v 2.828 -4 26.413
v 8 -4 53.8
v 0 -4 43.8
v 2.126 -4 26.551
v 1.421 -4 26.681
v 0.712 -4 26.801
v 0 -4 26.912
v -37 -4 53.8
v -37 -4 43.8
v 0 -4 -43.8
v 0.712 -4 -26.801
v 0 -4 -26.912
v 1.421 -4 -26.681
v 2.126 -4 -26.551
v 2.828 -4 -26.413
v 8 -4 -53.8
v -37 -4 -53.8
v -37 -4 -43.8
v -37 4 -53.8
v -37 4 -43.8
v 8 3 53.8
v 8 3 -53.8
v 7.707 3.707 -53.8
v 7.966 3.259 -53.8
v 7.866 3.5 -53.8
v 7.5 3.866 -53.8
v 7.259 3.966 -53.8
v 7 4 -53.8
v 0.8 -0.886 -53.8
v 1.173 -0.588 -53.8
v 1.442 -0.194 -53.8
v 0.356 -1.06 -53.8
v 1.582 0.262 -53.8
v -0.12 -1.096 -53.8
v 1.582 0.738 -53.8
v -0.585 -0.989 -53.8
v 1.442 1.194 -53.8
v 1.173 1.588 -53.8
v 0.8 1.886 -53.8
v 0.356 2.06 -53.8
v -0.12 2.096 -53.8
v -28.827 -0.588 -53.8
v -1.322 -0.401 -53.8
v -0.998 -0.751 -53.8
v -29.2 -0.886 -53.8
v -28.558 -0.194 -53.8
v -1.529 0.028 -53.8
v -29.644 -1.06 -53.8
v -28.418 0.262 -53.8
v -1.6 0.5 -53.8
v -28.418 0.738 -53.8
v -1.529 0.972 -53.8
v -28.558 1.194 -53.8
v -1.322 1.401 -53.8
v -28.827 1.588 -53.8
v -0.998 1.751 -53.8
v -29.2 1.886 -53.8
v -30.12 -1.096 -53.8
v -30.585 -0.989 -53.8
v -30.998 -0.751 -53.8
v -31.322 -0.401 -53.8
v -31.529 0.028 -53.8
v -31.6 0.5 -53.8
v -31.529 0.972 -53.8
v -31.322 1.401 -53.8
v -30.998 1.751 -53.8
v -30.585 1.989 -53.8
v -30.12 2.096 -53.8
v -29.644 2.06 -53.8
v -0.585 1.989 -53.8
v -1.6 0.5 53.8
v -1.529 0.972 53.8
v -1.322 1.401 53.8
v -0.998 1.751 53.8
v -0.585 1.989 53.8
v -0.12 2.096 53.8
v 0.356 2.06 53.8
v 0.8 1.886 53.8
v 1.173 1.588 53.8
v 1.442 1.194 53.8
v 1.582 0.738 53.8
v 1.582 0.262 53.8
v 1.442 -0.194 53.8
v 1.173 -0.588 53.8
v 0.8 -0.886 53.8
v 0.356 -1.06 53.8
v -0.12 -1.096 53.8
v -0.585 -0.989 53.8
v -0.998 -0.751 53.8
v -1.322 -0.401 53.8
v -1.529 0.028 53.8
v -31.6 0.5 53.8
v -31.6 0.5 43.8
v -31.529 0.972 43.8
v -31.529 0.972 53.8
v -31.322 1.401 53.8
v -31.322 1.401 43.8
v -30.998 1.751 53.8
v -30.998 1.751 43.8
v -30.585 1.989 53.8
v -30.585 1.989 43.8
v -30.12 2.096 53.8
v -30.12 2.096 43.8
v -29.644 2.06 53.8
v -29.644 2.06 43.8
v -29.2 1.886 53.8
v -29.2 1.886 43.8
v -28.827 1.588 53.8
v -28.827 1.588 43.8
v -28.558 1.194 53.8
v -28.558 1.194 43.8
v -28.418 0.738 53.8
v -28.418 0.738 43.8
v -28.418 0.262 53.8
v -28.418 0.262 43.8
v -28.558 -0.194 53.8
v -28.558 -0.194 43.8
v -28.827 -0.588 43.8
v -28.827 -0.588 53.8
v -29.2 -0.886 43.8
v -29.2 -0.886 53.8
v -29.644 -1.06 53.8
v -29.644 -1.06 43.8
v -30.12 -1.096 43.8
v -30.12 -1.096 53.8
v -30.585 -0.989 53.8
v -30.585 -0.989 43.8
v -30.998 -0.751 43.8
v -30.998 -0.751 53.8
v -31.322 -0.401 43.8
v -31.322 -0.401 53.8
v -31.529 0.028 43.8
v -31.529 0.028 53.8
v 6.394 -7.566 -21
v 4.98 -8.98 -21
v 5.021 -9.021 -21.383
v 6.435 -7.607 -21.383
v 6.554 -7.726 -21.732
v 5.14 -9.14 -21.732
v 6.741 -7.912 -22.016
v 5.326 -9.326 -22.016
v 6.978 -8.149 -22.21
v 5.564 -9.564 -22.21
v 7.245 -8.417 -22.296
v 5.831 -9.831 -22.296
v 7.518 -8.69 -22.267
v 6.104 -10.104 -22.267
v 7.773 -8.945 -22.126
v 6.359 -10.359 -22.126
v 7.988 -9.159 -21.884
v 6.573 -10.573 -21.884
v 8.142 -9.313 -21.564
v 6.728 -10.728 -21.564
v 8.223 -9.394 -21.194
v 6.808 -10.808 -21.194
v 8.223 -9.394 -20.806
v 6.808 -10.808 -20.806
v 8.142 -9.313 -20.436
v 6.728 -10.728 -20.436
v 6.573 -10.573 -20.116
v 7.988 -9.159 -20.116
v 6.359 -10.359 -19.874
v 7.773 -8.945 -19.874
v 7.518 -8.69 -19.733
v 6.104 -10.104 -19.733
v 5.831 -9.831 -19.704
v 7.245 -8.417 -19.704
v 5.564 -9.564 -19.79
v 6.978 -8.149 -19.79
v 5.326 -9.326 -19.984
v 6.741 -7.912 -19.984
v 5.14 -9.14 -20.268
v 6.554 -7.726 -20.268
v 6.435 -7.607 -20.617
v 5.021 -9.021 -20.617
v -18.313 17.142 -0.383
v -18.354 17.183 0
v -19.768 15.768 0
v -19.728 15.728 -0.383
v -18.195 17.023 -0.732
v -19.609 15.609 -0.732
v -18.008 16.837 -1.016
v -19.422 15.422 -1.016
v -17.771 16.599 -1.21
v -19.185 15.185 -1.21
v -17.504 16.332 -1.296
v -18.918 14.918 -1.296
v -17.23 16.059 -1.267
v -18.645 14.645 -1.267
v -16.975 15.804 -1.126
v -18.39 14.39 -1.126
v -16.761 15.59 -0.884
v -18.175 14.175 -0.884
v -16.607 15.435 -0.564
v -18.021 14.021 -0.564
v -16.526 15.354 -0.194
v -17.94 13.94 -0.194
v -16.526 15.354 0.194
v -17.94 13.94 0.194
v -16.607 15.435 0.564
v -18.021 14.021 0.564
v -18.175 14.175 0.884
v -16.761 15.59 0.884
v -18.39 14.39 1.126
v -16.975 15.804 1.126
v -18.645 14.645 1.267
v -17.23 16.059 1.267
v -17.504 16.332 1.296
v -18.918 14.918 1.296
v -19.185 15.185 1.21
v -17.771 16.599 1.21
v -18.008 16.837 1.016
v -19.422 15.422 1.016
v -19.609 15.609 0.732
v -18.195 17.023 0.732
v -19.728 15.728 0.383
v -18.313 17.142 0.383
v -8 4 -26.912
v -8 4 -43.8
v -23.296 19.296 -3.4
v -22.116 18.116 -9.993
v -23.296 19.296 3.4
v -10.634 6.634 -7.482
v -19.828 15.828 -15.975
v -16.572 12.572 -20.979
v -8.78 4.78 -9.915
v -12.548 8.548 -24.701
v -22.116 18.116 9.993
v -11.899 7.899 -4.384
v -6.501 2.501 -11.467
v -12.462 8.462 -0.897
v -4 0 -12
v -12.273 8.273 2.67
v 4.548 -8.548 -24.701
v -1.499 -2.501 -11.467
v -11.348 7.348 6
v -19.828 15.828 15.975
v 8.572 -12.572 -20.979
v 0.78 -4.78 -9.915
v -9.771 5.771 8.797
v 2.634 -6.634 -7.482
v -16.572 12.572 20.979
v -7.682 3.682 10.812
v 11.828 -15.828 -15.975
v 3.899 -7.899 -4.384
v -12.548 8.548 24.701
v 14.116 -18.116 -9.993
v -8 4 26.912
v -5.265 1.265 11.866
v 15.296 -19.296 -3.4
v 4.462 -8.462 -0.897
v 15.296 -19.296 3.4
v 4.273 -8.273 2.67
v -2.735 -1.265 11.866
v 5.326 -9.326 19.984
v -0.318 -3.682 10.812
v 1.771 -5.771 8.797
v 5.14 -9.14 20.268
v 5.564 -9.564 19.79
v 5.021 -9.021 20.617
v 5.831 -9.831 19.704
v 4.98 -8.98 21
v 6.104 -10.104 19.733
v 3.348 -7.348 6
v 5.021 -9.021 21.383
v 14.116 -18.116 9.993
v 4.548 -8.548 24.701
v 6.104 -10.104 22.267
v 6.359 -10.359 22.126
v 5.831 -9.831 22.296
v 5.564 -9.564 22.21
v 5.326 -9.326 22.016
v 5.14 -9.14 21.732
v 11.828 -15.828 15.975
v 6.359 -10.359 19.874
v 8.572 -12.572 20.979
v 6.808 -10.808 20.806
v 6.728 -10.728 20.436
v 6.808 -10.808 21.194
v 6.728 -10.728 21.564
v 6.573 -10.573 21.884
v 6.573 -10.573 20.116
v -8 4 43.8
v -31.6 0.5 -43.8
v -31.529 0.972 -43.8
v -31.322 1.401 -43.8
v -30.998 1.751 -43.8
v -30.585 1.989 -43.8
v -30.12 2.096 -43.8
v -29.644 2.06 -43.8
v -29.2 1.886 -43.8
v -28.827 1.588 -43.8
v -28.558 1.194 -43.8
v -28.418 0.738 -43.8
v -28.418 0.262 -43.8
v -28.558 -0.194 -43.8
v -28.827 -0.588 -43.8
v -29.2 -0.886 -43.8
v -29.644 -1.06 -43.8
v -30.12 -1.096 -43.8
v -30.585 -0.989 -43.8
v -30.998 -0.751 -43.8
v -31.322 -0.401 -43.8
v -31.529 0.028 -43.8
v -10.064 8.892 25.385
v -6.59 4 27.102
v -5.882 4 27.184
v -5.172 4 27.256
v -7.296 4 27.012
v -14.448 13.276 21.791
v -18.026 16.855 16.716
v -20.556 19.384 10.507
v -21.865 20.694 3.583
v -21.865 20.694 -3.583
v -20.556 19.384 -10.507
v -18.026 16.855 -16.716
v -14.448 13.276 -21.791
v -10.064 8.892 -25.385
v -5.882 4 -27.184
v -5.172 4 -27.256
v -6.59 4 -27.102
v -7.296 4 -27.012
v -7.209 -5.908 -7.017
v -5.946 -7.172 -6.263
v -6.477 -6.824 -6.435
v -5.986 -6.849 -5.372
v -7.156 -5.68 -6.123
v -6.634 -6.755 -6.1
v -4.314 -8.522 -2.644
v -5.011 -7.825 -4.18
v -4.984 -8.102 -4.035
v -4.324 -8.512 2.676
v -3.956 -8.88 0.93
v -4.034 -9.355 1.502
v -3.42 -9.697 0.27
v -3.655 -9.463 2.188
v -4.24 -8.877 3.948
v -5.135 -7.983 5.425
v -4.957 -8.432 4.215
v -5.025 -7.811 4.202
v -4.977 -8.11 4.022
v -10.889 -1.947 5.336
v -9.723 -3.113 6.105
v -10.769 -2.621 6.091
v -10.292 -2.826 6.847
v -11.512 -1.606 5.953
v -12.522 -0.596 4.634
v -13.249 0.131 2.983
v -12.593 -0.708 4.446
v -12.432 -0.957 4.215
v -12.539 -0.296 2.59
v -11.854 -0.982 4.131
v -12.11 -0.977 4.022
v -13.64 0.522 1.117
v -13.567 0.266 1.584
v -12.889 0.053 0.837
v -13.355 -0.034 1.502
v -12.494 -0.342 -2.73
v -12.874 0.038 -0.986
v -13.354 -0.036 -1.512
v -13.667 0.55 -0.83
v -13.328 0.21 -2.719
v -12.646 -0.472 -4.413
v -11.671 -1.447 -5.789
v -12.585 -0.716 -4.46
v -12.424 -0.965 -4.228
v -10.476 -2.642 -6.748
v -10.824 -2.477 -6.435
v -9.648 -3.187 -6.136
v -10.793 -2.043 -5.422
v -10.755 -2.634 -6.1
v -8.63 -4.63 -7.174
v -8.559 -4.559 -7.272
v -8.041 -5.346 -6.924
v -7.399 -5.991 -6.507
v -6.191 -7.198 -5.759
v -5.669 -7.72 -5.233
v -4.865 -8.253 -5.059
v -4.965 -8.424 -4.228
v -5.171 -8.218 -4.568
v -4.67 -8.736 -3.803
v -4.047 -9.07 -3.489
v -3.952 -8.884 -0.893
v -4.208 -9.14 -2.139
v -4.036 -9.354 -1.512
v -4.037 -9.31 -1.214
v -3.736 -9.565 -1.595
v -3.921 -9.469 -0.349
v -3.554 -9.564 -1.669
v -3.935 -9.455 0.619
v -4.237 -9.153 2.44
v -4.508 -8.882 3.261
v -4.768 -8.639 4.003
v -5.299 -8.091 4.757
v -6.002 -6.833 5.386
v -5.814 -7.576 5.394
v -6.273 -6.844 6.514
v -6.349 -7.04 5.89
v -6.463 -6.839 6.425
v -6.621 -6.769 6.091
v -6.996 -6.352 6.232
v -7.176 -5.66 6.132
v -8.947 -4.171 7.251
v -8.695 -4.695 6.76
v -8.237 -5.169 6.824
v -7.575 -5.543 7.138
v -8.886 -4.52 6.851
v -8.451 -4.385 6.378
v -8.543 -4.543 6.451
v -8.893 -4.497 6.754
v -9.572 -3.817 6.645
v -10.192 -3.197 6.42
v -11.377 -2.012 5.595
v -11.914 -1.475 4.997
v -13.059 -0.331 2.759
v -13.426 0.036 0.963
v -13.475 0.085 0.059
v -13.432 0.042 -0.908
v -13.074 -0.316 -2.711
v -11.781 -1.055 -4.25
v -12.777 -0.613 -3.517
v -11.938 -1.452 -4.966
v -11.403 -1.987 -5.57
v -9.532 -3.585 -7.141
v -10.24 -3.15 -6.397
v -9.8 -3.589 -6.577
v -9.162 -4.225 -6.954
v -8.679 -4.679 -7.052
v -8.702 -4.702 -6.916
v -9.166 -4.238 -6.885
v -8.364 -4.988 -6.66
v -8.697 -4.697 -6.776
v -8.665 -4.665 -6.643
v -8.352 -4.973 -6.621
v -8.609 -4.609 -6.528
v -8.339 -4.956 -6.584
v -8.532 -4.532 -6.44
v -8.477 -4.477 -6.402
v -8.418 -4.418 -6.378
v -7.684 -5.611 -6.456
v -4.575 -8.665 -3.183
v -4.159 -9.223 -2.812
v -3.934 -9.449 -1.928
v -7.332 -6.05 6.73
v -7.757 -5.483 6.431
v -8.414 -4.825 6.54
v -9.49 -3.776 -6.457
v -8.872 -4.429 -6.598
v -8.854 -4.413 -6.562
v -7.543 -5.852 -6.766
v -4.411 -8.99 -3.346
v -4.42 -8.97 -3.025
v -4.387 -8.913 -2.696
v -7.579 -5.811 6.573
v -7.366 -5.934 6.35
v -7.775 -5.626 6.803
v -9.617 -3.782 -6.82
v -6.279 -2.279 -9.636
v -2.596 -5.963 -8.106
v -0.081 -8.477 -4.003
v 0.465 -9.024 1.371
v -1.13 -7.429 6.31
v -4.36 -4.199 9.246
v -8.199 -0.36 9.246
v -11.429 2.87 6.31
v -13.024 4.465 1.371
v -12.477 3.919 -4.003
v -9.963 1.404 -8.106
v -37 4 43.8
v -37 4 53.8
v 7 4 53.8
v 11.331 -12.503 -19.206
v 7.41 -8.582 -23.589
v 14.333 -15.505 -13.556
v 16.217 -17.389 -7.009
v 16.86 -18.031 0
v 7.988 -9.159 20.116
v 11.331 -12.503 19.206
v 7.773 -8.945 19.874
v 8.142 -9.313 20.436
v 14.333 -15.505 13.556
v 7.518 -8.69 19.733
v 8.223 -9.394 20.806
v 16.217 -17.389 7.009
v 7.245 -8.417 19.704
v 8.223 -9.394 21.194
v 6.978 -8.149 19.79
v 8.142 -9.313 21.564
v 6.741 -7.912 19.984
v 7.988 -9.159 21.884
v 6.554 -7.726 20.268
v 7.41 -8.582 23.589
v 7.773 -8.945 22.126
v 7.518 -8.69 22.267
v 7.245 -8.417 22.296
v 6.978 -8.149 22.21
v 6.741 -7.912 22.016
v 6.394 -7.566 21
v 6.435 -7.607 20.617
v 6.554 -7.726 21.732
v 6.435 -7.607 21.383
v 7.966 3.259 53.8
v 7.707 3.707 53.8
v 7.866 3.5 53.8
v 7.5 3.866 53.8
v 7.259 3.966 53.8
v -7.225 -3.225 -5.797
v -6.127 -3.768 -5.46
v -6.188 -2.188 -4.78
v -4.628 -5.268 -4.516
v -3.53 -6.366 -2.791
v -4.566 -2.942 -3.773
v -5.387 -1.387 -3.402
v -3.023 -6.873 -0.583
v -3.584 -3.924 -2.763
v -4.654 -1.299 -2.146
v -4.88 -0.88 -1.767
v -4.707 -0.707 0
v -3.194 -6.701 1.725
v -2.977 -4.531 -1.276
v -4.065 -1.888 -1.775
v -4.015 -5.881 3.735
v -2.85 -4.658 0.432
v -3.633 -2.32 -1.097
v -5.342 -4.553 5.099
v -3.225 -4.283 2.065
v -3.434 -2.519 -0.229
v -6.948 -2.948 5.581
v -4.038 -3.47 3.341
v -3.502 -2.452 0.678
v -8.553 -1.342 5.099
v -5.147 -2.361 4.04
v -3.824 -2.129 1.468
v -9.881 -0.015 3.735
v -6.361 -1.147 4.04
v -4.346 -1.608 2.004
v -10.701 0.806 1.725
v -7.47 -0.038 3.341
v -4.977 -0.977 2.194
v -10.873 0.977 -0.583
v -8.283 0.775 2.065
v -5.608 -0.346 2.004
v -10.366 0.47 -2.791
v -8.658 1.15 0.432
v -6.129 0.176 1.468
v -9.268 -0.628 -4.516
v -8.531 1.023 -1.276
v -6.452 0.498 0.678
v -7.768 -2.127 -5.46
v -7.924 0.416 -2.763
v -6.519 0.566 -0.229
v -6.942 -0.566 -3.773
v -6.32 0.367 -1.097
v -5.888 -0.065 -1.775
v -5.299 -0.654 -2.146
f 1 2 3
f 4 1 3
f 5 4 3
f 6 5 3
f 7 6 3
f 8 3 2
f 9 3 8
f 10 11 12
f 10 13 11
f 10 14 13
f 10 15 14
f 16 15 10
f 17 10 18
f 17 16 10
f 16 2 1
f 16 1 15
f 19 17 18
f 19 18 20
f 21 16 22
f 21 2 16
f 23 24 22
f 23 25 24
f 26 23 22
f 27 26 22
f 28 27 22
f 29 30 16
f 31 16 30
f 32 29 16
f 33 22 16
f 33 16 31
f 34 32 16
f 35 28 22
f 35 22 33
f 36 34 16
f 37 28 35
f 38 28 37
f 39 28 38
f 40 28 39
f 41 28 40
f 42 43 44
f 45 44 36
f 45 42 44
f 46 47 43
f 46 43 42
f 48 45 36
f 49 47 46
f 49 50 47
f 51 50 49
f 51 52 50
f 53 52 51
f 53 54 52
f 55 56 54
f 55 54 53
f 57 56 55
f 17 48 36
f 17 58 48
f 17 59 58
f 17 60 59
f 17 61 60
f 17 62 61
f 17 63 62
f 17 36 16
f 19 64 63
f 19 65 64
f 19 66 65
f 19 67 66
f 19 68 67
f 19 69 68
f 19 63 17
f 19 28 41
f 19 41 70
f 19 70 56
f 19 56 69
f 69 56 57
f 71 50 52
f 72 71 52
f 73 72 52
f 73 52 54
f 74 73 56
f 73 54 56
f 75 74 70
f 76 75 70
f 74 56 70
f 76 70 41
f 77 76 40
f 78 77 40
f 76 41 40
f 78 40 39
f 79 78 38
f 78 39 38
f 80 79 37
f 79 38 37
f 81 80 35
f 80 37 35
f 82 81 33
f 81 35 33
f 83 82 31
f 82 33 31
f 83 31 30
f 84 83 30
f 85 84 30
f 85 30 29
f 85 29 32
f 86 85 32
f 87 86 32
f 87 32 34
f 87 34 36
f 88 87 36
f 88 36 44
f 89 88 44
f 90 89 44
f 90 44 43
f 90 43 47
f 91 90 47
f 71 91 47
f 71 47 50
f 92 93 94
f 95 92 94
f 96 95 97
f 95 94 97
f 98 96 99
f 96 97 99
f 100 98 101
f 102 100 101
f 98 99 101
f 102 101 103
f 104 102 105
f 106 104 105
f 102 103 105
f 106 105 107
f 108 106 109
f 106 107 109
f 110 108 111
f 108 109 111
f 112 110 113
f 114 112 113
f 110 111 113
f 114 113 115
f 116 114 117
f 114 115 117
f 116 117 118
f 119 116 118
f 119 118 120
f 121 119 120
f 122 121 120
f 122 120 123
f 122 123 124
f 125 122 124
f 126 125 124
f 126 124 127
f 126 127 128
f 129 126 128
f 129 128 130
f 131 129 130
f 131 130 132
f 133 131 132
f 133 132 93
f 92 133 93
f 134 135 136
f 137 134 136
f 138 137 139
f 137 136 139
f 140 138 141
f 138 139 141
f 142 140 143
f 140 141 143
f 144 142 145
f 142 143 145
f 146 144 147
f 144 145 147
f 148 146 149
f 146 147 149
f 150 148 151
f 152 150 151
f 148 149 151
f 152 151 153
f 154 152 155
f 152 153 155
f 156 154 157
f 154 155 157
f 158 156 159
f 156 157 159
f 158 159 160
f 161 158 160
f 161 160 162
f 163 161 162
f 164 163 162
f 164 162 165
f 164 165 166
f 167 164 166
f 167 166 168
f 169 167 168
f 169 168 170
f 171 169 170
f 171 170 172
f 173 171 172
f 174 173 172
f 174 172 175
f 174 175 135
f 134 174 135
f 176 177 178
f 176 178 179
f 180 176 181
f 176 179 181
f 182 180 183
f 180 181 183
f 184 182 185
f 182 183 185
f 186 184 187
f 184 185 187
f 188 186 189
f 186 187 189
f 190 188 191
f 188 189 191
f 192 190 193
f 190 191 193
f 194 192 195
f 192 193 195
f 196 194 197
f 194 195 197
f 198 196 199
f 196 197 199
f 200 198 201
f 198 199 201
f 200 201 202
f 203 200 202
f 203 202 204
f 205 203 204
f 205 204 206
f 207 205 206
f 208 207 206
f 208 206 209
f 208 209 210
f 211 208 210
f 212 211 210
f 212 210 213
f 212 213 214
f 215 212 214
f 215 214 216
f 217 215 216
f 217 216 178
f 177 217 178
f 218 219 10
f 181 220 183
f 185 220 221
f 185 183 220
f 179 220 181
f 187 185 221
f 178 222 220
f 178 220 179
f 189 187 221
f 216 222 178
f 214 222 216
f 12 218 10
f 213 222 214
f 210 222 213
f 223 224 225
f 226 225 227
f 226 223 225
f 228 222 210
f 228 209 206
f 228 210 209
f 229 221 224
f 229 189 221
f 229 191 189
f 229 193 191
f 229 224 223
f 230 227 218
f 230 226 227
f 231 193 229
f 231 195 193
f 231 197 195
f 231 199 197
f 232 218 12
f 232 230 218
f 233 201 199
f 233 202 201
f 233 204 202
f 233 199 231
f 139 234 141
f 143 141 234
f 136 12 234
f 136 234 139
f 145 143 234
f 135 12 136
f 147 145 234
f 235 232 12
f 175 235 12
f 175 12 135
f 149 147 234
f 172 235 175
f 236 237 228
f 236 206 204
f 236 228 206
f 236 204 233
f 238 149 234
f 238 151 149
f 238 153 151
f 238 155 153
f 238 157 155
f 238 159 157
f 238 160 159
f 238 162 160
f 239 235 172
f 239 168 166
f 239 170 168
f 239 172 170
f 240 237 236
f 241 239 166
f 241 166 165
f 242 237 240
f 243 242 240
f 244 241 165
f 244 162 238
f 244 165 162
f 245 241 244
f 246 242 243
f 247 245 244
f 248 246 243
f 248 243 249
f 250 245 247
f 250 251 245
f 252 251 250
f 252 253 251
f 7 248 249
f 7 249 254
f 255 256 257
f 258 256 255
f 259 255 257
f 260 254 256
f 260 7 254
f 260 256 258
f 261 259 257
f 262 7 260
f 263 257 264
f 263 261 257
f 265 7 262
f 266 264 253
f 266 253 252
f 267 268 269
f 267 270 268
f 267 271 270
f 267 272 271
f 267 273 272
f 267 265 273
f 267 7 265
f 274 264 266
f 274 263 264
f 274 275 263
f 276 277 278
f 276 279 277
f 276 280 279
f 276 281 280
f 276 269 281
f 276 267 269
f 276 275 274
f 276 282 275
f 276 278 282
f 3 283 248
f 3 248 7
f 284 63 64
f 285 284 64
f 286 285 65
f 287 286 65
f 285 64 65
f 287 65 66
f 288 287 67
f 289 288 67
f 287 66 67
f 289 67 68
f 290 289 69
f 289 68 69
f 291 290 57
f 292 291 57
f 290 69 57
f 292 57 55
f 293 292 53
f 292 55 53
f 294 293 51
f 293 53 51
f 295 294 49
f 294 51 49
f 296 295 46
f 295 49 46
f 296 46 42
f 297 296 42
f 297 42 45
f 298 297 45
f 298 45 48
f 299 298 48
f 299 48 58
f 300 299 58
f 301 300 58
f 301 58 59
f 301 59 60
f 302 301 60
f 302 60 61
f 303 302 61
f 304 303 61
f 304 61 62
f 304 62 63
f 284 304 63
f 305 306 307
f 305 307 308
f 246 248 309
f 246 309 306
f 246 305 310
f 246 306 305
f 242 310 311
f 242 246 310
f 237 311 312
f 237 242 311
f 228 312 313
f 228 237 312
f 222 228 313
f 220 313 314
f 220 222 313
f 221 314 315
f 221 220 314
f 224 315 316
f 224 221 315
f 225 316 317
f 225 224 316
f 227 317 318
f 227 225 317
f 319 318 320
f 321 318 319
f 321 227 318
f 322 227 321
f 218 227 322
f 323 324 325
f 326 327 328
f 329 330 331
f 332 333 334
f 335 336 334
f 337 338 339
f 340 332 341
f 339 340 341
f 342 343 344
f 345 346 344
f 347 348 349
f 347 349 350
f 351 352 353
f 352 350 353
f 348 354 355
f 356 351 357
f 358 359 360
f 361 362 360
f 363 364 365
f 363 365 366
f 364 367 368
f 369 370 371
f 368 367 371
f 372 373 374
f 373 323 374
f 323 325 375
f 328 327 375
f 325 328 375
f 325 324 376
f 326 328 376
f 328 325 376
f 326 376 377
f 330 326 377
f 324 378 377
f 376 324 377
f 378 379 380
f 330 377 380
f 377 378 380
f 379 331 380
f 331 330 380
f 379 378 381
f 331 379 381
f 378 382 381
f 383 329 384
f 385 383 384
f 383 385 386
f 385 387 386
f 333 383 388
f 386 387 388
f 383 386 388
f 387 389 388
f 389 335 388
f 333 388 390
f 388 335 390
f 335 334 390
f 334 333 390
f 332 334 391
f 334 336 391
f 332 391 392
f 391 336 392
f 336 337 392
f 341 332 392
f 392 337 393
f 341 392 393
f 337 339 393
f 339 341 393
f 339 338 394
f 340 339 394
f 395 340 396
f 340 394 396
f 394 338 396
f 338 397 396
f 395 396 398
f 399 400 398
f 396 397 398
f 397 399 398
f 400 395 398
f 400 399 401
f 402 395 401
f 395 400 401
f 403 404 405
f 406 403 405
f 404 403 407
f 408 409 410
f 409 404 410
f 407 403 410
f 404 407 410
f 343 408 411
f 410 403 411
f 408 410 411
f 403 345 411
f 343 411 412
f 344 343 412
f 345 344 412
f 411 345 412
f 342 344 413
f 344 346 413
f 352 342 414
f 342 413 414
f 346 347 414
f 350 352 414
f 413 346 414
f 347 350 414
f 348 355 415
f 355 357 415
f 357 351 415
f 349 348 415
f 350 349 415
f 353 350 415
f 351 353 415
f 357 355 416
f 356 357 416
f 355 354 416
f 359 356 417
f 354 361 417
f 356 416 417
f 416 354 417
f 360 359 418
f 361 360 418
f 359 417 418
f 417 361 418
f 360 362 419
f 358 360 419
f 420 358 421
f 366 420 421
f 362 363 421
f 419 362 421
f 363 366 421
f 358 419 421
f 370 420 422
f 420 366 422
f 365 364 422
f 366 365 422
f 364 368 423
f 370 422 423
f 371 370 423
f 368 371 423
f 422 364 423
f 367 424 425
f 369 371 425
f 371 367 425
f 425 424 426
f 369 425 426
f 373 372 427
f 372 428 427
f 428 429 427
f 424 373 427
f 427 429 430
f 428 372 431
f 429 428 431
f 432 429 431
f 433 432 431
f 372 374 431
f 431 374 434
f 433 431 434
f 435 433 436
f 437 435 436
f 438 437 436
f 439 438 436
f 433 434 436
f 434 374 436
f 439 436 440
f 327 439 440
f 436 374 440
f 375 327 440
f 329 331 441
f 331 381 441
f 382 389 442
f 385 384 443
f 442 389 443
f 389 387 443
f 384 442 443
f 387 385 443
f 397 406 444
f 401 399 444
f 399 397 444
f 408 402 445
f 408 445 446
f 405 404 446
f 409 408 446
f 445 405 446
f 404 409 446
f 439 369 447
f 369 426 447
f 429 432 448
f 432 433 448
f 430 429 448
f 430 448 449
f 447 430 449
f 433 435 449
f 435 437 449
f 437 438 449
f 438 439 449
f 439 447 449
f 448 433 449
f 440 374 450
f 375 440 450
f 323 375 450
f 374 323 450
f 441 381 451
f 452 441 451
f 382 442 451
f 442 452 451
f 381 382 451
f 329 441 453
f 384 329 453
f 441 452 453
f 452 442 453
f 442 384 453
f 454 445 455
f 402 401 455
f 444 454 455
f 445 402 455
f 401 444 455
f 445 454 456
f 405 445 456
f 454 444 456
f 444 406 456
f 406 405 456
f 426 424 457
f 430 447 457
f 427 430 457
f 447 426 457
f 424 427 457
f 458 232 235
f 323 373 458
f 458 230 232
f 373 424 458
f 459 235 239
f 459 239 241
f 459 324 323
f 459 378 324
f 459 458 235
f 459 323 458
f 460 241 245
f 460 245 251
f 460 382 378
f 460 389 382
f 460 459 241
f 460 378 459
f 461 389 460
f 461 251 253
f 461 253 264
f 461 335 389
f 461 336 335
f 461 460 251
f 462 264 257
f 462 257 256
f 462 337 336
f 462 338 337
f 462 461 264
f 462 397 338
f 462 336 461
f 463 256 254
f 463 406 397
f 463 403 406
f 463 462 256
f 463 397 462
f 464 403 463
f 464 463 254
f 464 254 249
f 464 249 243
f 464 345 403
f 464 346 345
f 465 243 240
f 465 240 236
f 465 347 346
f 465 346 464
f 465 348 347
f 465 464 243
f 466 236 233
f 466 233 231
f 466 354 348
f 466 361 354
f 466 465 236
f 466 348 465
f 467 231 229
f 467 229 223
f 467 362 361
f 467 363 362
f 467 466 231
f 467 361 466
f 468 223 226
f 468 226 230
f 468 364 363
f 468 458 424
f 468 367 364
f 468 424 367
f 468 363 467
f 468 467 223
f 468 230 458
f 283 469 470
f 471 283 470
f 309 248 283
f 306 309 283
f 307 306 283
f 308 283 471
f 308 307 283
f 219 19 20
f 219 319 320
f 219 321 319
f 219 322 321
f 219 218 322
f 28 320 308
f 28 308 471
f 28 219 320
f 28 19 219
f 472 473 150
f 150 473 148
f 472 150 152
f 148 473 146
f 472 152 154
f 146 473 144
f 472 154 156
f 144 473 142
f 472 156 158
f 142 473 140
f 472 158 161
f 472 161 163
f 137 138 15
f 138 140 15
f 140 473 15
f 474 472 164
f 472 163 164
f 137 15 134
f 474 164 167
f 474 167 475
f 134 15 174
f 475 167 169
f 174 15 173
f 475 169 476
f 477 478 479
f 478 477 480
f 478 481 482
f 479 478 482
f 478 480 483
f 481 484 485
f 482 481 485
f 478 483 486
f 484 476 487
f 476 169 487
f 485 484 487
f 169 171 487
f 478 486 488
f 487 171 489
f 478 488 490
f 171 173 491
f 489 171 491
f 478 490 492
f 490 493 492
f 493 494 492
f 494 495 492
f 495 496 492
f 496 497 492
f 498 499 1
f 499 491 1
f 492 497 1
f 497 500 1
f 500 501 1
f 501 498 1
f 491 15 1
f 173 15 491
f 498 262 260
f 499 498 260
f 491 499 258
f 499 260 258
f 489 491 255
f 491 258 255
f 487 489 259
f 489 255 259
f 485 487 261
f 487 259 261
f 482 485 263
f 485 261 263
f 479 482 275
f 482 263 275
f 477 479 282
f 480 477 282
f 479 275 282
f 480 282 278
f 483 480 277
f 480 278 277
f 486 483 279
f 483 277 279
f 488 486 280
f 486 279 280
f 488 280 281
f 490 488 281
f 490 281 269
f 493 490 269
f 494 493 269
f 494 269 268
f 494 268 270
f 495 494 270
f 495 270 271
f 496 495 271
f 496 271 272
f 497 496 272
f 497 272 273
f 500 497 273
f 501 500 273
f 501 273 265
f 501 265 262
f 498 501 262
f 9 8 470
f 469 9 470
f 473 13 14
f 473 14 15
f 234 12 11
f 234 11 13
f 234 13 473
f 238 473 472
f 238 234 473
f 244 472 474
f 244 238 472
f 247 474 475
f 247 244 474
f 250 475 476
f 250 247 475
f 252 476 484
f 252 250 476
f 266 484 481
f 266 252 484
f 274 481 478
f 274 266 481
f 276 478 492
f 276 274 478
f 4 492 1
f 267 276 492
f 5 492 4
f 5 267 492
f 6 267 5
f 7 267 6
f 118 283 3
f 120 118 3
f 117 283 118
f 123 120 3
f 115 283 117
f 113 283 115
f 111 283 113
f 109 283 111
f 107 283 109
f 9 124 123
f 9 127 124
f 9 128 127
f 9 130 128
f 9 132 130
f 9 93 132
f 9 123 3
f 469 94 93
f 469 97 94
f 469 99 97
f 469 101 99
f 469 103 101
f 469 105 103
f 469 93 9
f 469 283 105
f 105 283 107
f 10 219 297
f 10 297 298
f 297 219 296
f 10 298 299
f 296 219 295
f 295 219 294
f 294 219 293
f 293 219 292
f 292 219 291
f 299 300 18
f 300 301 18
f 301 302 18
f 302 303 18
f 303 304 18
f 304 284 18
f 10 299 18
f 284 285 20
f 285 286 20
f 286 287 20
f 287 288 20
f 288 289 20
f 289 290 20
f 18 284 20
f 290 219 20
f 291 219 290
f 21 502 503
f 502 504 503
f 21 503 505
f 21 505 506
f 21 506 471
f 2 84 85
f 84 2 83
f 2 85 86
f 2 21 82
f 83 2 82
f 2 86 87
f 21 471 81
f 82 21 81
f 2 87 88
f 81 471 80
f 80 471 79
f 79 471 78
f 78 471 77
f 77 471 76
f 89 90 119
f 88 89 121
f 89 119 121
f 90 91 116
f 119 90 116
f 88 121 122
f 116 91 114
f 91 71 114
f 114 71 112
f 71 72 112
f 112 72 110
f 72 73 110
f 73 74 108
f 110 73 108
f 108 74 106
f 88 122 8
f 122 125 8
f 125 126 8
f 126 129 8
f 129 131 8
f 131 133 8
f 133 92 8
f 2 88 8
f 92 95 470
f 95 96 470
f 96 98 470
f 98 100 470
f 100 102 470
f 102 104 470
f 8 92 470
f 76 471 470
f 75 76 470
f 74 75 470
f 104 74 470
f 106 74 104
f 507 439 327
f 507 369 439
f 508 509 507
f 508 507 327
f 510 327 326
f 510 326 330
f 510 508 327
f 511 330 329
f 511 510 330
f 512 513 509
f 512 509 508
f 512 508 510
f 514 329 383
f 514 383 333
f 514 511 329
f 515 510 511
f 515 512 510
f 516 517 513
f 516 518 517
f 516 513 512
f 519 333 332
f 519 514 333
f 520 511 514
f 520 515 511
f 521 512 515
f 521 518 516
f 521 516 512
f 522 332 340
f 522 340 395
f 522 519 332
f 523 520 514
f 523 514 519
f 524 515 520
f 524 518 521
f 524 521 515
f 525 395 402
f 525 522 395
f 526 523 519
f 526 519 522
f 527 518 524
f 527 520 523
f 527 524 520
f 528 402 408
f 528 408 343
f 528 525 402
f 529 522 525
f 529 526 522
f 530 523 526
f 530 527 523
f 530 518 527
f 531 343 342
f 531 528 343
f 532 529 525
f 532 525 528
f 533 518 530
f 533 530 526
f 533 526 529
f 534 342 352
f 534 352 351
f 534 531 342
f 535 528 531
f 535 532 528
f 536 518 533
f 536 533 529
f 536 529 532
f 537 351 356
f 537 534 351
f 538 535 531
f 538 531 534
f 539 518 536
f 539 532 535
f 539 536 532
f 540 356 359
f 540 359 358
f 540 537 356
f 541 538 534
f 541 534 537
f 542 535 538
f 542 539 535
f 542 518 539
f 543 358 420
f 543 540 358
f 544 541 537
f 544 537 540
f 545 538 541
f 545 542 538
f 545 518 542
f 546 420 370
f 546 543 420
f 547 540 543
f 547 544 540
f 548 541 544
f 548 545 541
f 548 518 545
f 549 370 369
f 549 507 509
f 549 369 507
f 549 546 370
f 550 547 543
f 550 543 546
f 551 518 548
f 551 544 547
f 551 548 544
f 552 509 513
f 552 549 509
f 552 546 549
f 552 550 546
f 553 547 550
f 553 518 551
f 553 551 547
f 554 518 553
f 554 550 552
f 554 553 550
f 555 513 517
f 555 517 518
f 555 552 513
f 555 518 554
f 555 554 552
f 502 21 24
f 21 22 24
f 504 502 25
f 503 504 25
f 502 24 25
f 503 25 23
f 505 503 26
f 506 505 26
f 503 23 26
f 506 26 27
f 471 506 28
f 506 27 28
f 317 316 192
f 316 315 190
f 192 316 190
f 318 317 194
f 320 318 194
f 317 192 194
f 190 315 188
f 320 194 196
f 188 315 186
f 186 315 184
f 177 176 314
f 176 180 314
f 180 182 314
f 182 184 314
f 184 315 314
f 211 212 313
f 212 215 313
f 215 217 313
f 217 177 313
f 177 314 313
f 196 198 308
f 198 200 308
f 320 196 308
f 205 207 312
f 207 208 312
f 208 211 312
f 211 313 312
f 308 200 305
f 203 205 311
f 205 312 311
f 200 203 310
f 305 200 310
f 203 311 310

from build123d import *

# Parameters (mm, degrees)
BASE_DEPTH                 = 53.8
SKETCH4_R                  = 27.5
BOSS_EXTRUDE2_DEPTH        = 2
M2_CLEARANCE_HOLE1_D       = 2.6
FILLET1_R                  = 0.5
SIDE_HOLES_D               = 3.2
SIDE_ARM_DEPTH             = 10
F_3_2_3_2_DIAMETER_HOLE1_D = 3.2
FILLET2_R                  = 1


with BuildPart() as part:
    # Sketch1 → Base (new, symmetric)
    with BuildSketch(Plane.XY):
        Polygon((8, 4), (-8, 4), (0, -4), (8, -4), align=None)
    extrude(amount=BASE_DEPTH, both=True)

    # Sketch4 → Boss-Extrude2 (add)
    with BuildSketch(Plane(origin=(-2, -2, 0), x_dir=(0, 0, 1), z_dir=(-0.7071067811865475, -0.7071067811865476, 0))):
        with Locations((0, 2.828427125)):
            Circle(SKETCH4_R)
    extrude(amount=-BOSS_EXTRUDE2_DEPTH)

    # M2 Clearance Hole1 (through all)
    with Locations(Plane(origin=(-0.585786438, -0.585786438, 0), x_dir=(0.7071067811865475, -0.7071067811865477, 0), z_dir=(0.7071067811865477, 0.7071067811865475, 0))):
        with Locations((-23.828427125, 0), (11.171572875, 21), (11.171572875, -21)):
            Hole(M2_CLEARANCE_HOLE1_D / 2)

    # Sketch8 → Revolve1 (revolve)
    with BuildSketch(Plane(origin=(-2, 2, 0), x_dir=(0, 0, 1), z_dir=(0.7071067811865437, -0.7071067811865515, 0))):
        with BuildLine():
            Line((0, 3.828427125), (0, 2.828427125))
            Line((0, 2.828427125), (-12, 2.828427125))
            Line((-12, 2.828427125), (-6.5, 10.328427125))
            ThreePointArc((-6.5, 10.328427125), (-4.596194078, 5.732233047), (0, 3.828427125))
        make_face()
    revolve(axis=Axis((-4, 0, 0), (-0.7071067811865515, -0.7071067811865437, 0)))

    # Fillet1
    fillet1_edges = [part.edges().sort_by_distance(p)[0] for p in [
        (-9.303300859, -5.303300859, 6.5),
    ]]
    fillet(fillet1_edges, radius=FILLET1_R)

    # Side Holes (through all)
    with Locations(Plane.XY.offset(53.8)):
        with Locations((0, 0.5)):
            Hole(SIDE_HOLES_D / 2)

    # Sketch9 → Side Arm (add)
    with BuildSketch(Plane.XY.offset(53.8)):
        Polygon((-8, 4), (0, -4), (-37, -4), (-37, 4), align=None)
    side_arm = extrude(amount=-SIDE_ARM_DEPTH)

    # Mirror1: Side Arm across plane
    add(side_arm.mirror(Plane.XY))

    # Ø3.2 (3.2) Diameter Hole1 (through all)
    with Locations(Plane.XY.offset(53.8)):
        with Locations((-30, 0.5)):
            Hole(F_3_2_3_2_DIAMETER_HOLE1_D / 2)

    # Fillet2
    fillet2_edges = [part.edges().sort_by_distance(p)[0] for p in [
        (8, 4, 0),
    ]]
    fillet(fillet2_edges, radius=FILLET2_R)


solid = part.part
